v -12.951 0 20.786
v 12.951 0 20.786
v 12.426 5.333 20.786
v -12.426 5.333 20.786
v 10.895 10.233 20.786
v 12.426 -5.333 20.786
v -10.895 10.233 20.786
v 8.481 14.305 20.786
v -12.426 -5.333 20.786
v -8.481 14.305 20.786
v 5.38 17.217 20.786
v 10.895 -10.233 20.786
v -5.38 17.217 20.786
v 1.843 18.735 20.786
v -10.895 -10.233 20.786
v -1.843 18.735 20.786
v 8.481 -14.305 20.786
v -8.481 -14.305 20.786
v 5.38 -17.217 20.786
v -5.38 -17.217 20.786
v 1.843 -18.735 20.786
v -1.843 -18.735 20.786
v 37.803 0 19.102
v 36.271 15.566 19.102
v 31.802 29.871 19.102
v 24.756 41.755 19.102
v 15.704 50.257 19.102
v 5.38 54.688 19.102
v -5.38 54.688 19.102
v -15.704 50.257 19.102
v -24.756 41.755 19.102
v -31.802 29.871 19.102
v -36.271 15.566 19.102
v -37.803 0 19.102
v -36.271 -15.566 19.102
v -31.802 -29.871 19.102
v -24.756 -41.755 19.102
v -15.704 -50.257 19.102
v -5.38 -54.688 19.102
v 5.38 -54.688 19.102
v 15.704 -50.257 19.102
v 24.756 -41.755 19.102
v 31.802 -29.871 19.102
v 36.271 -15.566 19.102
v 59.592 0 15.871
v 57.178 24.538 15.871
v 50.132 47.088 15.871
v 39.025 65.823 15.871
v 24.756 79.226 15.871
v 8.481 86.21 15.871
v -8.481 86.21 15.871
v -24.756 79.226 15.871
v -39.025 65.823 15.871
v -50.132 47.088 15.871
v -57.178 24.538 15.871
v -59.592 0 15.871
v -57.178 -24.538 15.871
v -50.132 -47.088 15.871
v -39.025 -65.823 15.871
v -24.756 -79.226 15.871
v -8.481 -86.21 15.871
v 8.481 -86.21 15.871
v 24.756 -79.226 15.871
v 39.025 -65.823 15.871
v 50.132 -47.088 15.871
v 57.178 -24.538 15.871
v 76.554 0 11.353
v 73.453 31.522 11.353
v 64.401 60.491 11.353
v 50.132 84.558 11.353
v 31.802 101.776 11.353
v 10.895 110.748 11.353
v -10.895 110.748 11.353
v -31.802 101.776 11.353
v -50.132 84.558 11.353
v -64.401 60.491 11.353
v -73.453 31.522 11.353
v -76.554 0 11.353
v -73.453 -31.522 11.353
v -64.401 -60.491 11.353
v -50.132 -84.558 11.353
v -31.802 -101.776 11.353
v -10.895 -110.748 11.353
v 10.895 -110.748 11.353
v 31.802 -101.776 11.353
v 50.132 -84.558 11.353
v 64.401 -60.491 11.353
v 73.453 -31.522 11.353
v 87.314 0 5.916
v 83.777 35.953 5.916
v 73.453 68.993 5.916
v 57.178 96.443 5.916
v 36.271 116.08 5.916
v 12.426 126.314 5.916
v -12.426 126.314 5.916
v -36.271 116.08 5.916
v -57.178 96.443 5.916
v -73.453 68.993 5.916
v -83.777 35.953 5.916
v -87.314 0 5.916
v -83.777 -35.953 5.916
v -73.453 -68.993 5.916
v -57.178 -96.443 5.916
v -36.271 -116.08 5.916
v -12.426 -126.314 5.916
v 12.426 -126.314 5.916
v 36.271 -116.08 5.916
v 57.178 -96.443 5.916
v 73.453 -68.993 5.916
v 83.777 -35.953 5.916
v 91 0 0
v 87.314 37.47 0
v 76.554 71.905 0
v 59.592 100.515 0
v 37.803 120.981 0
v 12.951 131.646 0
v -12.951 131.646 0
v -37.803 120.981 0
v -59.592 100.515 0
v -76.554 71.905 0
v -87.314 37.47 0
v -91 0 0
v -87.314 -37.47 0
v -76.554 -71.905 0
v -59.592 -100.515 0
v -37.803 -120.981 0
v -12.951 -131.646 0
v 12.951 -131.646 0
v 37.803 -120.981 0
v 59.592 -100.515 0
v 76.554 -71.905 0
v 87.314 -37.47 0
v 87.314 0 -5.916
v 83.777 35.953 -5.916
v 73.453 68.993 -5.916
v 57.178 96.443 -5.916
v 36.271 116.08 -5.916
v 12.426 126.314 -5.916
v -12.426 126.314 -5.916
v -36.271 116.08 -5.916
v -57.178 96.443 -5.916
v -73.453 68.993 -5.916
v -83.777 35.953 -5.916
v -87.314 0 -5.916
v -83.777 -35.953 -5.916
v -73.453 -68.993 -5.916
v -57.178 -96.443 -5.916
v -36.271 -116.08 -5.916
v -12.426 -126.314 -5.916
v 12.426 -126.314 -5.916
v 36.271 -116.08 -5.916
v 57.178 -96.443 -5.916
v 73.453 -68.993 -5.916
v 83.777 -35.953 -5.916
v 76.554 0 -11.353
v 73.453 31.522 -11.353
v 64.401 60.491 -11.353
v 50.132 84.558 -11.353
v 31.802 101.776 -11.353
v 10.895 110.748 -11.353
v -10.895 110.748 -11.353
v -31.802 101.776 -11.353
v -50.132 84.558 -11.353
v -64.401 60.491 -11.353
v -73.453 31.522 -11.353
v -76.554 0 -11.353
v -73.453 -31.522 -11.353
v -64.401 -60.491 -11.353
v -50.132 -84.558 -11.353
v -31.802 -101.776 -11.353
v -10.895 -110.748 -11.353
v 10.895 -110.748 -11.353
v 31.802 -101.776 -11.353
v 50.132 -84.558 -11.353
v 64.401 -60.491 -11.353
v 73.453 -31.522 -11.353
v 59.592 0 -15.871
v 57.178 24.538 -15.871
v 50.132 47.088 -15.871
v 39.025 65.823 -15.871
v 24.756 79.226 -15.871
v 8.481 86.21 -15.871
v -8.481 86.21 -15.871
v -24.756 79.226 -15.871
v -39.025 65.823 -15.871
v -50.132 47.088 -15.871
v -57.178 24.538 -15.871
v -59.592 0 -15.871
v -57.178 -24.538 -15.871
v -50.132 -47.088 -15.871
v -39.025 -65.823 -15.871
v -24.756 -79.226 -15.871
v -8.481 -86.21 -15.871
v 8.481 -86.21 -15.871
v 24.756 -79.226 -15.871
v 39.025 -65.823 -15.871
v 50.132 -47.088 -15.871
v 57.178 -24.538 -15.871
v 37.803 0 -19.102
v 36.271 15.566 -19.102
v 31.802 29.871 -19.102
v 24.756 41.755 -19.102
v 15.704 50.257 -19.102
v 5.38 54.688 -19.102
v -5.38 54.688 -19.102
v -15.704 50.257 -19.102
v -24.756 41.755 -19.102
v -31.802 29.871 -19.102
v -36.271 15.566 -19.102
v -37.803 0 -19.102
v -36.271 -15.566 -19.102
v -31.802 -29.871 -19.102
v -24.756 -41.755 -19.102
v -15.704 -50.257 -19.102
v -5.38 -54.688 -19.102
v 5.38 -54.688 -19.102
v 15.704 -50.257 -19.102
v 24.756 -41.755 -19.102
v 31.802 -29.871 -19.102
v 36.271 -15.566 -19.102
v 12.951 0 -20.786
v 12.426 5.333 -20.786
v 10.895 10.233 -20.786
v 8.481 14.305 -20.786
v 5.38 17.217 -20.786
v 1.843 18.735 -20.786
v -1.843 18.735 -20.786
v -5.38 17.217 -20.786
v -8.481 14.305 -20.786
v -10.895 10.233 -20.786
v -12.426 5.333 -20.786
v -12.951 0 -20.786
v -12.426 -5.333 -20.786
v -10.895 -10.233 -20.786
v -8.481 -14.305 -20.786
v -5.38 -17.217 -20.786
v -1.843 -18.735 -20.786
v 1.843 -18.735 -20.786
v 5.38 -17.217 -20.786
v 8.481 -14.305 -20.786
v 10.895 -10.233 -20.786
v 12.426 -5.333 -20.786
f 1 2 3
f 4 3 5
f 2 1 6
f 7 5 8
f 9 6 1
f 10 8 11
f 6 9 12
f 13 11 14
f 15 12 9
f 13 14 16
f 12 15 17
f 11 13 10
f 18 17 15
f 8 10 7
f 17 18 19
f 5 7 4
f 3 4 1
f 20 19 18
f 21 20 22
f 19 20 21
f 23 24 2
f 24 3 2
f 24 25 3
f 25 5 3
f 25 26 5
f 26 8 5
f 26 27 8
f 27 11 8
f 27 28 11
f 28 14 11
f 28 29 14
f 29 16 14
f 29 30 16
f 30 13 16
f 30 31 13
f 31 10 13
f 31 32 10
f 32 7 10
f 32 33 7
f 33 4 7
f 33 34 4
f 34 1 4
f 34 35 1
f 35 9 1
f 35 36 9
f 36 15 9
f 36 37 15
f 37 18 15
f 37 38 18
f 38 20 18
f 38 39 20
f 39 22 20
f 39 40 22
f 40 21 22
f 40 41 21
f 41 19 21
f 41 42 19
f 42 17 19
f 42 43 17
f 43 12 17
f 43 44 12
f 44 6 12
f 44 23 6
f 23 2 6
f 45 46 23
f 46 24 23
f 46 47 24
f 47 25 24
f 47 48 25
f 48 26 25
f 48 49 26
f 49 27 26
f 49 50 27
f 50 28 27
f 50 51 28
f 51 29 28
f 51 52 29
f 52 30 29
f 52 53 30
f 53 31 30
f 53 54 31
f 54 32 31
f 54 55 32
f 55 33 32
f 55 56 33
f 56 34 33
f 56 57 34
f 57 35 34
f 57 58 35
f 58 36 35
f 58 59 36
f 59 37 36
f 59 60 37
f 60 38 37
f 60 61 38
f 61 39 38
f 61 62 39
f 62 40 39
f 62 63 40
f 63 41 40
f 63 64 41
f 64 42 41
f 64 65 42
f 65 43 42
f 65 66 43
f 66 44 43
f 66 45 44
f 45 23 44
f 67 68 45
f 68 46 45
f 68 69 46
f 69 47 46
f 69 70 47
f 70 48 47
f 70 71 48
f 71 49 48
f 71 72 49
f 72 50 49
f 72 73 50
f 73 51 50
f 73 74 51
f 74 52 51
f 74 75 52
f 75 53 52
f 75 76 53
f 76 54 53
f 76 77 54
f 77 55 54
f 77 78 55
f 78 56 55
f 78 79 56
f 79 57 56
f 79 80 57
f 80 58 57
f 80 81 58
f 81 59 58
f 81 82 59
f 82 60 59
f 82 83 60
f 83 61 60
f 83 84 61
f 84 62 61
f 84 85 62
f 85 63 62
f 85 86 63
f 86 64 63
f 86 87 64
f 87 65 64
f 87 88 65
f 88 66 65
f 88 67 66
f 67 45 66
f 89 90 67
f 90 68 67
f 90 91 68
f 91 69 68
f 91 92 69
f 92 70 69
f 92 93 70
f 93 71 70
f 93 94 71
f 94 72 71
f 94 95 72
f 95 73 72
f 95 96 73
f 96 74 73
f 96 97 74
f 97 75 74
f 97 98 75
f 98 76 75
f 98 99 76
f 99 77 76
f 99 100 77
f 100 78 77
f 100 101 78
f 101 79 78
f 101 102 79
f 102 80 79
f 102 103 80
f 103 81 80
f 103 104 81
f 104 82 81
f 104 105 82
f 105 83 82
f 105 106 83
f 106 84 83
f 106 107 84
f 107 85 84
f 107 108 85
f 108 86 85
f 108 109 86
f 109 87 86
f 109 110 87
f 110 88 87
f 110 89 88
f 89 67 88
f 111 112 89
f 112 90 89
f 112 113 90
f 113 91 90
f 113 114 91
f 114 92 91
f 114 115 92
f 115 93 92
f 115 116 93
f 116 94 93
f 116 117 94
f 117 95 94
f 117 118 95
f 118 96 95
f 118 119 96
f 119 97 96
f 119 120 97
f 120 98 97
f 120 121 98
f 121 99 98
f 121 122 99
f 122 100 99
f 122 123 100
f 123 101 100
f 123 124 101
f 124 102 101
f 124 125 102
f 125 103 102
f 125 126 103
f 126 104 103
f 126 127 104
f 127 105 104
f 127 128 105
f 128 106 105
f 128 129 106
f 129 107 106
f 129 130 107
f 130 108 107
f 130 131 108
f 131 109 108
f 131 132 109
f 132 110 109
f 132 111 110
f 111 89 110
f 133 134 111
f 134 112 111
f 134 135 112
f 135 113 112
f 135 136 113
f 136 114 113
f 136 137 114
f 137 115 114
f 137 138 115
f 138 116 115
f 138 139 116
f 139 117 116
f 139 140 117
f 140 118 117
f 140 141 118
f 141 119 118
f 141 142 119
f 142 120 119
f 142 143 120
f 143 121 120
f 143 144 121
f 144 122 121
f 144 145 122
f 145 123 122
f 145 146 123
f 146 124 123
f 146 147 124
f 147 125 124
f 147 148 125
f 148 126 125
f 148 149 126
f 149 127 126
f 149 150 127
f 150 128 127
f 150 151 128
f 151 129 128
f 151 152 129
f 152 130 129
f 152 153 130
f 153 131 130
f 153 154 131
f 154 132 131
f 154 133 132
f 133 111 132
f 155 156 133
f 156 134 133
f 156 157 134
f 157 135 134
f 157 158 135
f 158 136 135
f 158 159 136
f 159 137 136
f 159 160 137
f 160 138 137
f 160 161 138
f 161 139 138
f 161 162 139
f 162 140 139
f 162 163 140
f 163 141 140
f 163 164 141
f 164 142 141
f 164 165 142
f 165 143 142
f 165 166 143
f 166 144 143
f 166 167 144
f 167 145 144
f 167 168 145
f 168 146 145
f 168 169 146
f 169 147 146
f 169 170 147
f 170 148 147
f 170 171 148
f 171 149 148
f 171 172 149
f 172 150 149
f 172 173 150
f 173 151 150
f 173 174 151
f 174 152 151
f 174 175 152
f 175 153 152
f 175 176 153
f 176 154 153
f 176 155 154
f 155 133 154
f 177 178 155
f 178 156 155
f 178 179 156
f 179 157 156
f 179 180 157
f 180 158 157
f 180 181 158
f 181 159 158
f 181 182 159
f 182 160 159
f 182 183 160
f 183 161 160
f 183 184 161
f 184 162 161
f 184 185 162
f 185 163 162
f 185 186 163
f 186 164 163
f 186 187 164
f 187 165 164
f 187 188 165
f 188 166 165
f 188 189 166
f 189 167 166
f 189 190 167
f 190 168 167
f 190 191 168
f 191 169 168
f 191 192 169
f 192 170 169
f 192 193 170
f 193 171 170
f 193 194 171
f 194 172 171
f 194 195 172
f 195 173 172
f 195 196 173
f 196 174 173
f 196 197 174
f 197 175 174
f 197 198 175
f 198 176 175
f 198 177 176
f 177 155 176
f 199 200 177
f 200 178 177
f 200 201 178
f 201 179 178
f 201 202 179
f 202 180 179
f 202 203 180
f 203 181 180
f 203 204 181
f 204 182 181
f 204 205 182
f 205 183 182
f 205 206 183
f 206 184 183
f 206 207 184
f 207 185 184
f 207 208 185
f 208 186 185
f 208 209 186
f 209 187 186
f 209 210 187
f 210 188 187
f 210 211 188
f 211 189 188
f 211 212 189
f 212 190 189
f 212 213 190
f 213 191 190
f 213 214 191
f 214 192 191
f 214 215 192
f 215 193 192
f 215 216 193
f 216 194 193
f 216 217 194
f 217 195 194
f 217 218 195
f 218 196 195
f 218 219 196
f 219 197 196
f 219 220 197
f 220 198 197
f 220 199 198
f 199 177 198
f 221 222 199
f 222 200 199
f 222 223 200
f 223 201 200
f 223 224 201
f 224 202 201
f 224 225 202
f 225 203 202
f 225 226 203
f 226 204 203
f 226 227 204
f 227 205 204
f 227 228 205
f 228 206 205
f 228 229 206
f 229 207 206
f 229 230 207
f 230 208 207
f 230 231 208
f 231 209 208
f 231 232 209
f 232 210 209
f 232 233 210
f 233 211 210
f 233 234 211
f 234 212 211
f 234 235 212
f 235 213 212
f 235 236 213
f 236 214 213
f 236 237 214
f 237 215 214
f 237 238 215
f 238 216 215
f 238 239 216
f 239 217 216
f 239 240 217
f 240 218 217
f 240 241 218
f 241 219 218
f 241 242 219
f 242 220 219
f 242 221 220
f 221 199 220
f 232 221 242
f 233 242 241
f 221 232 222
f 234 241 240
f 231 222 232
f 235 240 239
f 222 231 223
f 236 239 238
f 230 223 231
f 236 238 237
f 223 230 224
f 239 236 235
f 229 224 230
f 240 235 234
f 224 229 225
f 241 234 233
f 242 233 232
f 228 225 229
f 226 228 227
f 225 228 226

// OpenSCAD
// Generated by SolidPython 1.0.1 on 2020-07-29 00:46:51


scale(v = [13, 19, 3]) {
	sphere(r = 7);
}
/***********************************************
*********      SolidPython code:      **********
************************************************
 
# import packages: SolidPython
from solid import *
from solid.utils import *
from itertools import chain, combinations, permutations


class Resize:

    def __init__(self, scad_file):
        self.scad_file = scad_file
        #self.scad_file = import_scad(scad_file)
        # cone/cylinder param:
        self.r1 = 0
        self.r2 = 0
        self.h = 0
        # rectangular prism param:
        self.w = 0
        self.l = 0
        # ellipse param:
        self.r = 0

    # import OpenScad code (file name corresponds to shape)


    # classify shape + parameters
    def assign(self, param1, param2, param3):
        if self.scad_file == 'cone.scad':
            self.r1 = param1
            self.r2 = param2
            self.h = param3
        elif self.scad_file == 'cylinder.scad':
            self.r1 = param1
            self.r2 = param2
            self.h = param3
        elif self.scad_file == 'rectangularPrism.scad':
            self.h = param1
            self.l = param2
            self.w = param3
        else:
            self.r = param1
            self.h = param2

    # resize parameters
    def iterate(self):
        x = range(3, 20, 2)
        i = 1
        if self.scad_file == 'cone.scad':
            tempList = list(permutations(x, 2))
            for temp in tempList:
                param1 = temp[0]
                param2 = temp[1]
                filepath = 'produced_scad_files/' + 'cone' + str(param1) + '_' + str(param2) + '_' + '.scad'
                scad_render_to_file(cylinder(h=param1, r1=param2, r2=0), filepath)

        elif self.scad_file == 'cylinder.scad':
            tempList = list(permutations(x, 3))
            for temp in tempList:
                param1 = temp[0]
                param2 = temp[1]
                filepath = 'produced_scad_files/' + 'cylinder' + str(param1) + '_' + str(param2) + '_' + '.scad'
                scad_render_to_file(cylinder(h=param1, r1=param2, r2=param2), filepath)

        elif self.scad_file == 'rectangularPrism.scad':
            tempList = list(permutations(x, 3))
            for temp in tempList:
                param1 = temp[0]
                param2 = temp[1]
                param3 = temp[2]
                filepath = 'produced_scad_files/' + 'rectangularPrism' + str(param1) + '_' + str(param2) + '_' + str(
                    param3) + '.scad'
                scad_render_to_file(cube(size=(param1, param2, param3)), filepath)

        elif self.scad_file == 'ellipse.scad':
            tempList = list(permutations(x, 4))
            for temp in tempList:
                param1 = temp[0]
                param2 = temp[1]
                param3 = temp[2]
                param4 = temp[3]
                filepath = 'produced_scad_files/' + 'ellipse' + str(param1) + '_' + str(param2) + '_' + str(param3) + '_' + str(param4) + '.scad'
                scad_render_to_file(scale([param1, param2, param3])(sphere(r=param4)), filepath)

    def render_to_scadfile(self):
        scad_render_to_file(scad, 'example.scad') 
 
************************************************/
